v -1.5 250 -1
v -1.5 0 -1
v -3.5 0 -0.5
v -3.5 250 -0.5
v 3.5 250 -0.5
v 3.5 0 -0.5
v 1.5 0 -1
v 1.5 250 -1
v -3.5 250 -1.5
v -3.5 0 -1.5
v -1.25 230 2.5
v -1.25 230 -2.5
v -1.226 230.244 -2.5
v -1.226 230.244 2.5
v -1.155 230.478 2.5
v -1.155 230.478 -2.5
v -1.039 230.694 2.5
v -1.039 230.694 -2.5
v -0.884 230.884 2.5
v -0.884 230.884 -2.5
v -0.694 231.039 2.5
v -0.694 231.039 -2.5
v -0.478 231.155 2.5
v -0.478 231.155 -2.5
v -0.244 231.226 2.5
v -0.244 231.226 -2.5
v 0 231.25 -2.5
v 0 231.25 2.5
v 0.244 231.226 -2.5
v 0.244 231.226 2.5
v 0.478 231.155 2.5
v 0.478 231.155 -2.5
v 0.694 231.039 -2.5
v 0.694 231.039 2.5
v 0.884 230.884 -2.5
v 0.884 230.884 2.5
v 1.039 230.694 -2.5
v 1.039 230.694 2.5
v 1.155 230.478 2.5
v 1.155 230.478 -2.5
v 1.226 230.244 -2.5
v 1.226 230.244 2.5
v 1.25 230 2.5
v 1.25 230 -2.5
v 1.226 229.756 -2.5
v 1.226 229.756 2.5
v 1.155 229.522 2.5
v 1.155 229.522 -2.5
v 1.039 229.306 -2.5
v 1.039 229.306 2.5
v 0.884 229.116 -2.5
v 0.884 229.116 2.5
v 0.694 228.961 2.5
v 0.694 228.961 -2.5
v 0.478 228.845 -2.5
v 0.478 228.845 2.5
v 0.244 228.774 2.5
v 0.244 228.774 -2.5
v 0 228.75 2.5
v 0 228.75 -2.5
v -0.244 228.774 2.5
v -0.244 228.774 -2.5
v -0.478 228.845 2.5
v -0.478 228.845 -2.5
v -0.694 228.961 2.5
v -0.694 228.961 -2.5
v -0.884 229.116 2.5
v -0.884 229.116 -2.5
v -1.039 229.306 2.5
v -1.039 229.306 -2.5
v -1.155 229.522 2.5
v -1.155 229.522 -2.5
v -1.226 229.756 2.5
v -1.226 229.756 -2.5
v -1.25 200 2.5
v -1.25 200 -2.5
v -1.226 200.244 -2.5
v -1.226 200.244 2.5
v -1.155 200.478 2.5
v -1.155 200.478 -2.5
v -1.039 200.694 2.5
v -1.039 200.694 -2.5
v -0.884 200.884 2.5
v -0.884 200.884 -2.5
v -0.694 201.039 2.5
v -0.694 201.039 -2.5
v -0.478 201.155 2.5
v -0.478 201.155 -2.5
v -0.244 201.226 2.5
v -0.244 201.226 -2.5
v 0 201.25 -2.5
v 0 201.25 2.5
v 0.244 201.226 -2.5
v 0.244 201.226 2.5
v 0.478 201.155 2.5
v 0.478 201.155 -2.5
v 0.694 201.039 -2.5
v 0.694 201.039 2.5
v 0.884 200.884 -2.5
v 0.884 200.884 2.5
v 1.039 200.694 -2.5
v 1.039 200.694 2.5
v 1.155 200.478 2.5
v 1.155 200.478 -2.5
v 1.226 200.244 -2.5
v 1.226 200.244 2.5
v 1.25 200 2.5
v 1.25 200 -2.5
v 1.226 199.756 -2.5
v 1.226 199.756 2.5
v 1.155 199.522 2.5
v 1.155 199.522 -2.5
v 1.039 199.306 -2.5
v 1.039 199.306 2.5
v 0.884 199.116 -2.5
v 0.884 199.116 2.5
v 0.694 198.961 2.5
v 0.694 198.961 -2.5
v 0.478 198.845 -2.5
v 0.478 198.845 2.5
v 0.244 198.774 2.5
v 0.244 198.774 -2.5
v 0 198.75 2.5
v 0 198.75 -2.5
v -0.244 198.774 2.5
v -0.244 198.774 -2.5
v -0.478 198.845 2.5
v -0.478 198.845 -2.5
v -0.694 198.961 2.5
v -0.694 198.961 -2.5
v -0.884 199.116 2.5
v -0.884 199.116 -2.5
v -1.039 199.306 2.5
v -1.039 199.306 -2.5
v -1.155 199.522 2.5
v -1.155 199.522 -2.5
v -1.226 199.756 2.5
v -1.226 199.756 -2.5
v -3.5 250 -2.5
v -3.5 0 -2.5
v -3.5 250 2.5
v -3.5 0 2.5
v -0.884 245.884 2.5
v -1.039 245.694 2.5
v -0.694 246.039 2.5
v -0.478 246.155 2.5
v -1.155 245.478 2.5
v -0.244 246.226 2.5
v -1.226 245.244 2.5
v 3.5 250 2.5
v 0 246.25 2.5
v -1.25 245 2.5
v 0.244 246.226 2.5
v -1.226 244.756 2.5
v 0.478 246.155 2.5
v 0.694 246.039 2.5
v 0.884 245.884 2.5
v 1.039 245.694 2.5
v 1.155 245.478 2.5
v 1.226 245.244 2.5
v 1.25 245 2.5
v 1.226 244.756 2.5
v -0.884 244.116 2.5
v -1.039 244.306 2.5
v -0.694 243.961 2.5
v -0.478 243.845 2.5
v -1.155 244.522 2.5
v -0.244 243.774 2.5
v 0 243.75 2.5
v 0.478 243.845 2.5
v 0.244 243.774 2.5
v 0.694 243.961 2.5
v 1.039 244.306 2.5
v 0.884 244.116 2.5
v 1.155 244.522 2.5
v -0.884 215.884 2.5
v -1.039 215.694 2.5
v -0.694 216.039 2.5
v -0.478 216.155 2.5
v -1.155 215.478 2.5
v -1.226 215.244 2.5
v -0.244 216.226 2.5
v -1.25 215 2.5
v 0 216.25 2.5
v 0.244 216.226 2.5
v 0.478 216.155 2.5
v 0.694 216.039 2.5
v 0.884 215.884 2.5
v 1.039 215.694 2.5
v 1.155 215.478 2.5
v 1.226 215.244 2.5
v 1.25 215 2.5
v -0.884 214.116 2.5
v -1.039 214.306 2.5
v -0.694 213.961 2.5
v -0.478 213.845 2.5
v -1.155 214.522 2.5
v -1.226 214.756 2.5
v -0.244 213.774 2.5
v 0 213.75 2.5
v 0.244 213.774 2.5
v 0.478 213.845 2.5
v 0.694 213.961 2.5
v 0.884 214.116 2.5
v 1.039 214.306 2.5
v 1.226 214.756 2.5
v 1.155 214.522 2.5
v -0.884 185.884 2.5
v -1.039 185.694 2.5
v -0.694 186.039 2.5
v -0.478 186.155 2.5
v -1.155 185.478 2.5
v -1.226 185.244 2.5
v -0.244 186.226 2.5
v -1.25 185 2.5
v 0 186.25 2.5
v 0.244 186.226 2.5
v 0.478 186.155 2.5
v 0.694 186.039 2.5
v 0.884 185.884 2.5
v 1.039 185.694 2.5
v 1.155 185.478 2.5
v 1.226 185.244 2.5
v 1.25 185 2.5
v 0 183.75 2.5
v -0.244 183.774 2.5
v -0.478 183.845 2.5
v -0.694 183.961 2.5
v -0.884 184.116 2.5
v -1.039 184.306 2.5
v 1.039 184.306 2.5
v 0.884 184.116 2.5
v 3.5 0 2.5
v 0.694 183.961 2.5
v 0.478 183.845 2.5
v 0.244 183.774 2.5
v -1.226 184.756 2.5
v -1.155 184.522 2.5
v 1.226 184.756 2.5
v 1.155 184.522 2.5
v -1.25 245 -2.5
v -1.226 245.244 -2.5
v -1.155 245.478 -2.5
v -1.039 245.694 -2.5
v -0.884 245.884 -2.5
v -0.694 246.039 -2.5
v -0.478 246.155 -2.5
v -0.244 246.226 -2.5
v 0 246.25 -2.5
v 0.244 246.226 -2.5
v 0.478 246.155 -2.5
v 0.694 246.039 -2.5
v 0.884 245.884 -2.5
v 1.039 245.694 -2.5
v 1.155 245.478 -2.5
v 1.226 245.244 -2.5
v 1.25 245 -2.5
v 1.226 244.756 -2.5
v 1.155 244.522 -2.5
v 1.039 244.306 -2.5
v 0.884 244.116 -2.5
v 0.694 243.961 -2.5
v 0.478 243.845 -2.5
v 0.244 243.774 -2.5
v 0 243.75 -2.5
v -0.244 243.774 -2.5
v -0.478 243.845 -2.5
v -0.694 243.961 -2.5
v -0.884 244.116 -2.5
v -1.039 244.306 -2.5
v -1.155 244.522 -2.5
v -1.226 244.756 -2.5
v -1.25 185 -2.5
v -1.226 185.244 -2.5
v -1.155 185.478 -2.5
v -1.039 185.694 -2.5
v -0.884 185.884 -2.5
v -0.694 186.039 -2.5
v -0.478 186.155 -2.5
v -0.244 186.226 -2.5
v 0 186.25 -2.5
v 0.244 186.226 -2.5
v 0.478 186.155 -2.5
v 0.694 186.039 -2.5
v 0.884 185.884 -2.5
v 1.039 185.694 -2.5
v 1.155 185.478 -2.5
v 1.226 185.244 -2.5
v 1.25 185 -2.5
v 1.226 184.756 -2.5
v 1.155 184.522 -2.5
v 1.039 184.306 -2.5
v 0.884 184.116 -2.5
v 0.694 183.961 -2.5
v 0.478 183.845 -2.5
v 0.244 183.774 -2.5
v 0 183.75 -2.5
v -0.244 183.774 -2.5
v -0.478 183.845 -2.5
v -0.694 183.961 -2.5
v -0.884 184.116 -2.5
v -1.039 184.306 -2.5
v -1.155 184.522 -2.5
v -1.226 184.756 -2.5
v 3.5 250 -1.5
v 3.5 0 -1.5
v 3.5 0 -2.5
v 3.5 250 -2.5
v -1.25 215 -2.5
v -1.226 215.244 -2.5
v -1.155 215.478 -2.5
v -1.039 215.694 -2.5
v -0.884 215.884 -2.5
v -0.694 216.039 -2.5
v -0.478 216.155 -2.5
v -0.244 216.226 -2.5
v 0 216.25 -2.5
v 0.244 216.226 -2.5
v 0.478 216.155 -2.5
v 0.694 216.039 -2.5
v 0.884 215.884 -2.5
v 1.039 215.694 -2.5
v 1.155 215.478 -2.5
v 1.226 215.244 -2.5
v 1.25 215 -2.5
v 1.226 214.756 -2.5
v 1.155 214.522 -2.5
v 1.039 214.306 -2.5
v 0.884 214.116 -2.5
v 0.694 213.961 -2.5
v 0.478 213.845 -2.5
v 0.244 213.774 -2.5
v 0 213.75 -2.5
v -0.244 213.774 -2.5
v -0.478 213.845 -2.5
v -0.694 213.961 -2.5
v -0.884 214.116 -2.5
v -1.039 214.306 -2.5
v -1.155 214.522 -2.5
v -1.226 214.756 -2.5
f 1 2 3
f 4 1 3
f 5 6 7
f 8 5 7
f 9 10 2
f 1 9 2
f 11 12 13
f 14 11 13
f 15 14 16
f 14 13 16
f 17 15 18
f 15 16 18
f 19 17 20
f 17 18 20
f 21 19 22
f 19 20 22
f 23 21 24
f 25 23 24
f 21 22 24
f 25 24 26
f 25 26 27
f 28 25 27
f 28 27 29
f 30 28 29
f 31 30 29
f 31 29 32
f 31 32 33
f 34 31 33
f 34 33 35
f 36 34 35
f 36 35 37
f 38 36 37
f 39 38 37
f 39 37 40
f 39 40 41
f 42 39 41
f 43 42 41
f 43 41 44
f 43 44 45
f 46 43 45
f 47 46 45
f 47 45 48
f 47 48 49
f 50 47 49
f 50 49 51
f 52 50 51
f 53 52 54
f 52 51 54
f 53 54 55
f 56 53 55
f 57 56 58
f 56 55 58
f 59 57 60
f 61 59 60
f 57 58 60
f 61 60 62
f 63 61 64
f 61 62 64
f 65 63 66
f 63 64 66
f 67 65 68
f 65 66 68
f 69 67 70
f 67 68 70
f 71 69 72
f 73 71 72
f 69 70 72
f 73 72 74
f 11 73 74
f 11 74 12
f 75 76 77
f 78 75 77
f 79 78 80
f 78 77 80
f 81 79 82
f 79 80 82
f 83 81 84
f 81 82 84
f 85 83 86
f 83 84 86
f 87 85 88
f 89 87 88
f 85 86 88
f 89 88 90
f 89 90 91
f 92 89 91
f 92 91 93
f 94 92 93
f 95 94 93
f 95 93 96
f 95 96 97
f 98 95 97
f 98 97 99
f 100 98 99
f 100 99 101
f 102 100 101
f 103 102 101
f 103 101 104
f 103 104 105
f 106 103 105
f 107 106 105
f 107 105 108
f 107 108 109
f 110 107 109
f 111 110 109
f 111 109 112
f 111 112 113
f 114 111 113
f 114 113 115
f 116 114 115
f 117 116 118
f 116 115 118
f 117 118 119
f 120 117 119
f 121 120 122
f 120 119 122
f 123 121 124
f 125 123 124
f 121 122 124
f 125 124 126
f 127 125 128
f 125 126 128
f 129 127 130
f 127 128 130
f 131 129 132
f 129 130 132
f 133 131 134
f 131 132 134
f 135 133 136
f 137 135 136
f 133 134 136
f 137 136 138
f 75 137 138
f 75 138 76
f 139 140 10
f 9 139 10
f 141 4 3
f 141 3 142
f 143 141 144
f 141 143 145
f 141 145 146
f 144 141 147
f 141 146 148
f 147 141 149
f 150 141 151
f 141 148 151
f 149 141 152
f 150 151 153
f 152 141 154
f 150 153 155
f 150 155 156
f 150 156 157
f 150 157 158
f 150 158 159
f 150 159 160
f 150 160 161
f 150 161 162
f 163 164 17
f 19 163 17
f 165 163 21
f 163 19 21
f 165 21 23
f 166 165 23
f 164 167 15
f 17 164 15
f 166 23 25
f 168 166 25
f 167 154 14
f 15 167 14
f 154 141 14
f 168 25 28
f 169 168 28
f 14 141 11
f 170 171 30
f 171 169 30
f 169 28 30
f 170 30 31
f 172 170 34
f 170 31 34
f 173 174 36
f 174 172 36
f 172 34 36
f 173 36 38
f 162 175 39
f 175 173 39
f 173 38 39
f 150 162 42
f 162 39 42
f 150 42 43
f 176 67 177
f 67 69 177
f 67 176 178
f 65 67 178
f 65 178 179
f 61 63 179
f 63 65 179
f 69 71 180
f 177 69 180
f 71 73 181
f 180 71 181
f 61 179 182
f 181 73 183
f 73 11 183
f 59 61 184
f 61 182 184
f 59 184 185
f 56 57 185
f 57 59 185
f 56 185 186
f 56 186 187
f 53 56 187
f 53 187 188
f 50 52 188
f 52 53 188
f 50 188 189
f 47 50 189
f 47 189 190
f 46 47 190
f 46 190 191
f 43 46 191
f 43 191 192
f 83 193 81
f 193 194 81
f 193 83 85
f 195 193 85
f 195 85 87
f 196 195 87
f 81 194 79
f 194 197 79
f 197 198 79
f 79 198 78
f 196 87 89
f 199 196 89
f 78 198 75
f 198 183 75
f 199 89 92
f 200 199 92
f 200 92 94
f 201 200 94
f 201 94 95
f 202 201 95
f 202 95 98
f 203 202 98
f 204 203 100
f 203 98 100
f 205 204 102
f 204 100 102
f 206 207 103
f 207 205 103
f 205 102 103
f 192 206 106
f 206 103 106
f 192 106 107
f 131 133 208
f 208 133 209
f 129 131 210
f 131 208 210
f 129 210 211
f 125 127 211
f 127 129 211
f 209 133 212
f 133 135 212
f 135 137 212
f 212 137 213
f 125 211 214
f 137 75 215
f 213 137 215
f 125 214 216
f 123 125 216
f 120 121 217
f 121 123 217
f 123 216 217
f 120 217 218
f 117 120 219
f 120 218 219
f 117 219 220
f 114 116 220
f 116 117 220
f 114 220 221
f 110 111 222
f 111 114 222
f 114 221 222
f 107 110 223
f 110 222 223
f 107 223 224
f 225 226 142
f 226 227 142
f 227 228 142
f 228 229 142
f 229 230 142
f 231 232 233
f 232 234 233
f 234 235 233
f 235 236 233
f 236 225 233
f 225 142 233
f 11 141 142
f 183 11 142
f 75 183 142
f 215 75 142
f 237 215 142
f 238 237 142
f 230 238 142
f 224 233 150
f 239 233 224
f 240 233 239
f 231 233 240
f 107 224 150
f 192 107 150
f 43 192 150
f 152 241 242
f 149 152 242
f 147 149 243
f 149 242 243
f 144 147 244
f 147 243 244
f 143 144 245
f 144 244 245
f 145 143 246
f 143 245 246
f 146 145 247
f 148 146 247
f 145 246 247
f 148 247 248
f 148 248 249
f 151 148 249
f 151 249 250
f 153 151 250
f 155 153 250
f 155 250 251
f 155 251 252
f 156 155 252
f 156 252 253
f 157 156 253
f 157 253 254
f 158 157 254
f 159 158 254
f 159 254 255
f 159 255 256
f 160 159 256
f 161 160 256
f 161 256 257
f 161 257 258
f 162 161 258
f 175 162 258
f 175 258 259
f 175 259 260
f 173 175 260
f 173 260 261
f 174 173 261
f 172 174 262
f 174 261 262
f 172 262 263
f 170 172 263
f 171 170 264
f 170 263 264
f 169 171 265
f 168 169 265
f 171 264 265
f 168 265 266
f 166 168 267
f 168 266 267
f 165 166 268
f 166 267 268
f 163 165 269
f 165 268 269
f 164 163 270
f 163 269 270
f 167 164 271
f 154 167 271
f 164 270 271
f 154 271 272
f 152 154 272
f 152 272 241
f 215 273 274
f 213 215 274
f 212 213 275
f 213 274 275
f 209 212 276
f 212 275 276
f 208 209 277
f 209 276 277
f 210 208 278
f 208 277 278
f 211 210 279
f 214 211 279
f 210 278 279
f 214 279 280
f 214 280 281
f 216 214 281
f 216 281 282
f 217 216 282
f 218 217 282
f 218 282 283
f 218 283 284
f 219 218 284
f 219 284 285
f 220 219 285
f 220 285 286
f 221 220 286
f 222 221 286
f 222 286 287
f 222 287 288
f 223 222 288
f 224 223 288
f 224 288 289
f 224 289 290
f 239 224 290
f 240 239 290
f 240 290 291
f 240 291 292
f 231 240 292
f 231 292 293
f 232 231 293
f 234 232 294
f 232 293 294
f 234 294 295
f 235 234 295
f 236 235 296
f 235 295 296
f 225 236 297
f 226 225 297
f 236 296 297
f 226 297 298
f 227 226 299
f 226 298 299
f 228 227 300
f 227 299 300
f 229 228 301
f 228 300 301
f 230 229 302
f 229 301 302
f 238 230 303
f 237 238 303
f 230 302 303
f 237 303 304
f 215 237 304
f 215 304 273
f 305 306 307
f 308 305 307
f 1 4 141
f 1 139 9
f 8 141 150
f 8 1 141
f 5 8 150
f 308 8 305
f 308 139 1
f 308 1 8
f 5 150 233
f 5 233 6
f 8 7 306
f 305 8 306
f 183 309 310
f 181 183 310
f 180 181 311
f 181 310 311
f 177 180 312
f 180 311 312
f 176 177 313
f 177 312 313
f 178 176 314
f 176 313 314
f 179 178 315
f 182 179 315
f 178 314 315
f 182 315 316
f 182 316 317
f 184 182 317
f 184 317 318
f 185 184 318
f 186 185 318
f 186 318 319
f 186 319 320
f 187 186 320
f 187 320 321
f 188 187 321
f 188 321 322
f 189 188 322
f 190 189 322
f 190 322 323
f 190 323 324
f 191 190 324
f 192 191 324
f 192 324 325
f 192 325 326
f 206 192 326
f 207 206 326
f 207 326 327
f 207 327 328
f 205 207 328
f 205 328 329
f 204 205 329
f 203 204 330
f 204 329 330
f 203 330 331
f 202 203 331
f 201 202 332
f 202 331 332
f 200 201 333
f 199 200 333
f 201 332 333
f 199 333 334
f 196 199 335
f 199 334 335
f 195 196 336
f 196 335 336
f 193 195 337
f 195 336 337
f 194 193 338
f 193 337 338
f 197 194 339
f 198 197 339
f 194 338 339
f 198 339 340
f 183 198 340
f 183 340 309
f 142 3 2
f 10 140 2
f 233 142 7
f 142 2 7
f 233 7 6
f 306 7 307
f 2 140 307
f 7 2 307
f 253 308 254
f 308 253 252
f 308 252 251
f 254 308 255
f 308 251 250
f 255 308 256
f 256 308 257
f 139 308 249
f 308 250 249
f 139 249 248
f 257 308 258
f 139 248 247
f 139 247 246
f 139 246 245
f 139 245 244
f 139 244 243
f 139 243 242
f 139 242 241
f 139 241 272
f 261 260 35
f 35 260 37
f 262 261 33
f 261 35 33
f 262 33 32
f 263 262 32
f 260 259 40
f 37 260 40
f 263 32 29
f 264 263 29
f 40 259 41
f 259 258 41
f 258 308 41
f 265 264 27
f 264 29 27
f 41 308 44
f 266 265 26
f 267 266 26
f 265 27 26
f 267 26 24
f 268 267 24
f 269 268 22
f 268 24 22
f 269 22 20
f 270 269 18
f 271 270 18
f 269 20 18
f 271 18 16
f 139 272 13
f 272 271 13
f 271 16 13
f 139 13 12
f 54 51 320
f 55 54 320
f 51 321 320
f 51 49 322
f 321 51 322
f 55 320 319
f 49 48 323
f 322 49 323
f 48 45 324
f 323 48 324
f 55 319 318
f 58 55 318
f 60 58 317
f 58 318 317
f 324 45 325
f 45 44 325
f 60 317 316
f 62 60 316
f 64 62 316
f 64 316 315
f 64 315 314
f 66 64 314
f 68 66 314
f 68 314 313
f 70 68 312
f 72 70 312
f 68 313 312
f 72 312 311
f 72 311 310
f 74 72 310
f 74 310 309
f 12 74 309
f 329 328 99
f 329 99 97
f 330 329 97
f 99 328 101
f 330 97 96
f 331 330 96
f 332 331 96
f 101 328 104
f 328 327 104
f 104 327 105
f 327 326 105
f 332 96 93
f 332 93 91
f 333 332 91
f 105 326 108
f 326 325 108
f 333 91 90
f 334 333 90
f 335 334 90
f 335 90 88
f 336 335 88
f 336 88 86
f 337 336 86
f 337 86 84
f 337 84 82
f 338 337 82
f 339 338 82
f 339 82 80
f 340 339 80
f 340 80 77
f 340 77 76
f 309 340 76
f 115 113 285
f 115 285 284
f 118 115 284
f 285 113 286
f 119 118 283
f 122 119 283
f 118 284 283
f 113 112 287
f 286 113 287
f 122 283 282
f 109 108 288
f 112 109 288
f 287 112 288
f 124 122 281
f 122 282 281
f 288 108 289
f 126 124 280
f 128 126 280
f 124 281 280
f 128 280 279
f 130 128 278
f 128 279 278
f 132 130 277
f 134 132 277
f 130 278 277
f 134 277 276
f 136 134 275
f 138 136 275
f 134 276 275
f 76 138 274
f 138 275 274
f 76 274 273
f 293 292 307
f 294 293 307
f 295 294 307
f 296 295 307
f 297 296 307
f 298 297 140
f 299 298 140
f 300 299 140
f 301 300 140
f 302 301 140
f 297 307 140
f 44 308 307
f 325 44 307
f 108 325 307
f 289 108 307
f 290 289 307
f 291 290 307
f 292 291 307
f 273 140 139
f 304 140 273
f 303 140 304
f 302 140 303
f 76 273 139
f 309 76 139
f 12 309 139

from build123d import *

# Parameters (mm, degrees)
EXTRUDE_1_DEPTH        = 250
SKETCH_2_R             = 1.25
CUT_EXTRUDE_3_DEPTH    = 251.074488903
PATTERN_LINEAR_1_COUNT = 5
PATTERN_LINEAR_1_PITCH = 15


with BuildPart() as part:
    # 草图1 → 凸台-拉伸1 (new body)
    with BuildSketch(Plane(origin=(0, 0, 0), x_dir=(1, 0, 0), z_dir=(0, 1, 0))):
        Polygon((-3.5, 1.5), (-1.5, 1), (-3.5, 0.5), (-3.5, -2.5), (3.5, -2.5), (3.5, 0.5), (1.5, 1), (3.5, 1.5), (3.5, 2.5), (-3.5, 2.5), align=None)
    extrude(amount=EXTRUDE_1_DEPTH)

    # 草图2 → 切除-拉伸3 (cut, through all)
    with BuildSketch(Plane(origin=(0, 0, -2.5), x_dir=(-1, 0, 0), z_dir=(0, 0, -1))):
        with Locations((0, 245)):
            Circle(SKETCH_2_R)
    cut_extrude_3 = extrude(amount=-CUT_EXTRUDE_3_DEPTH, mode=Mode.SUBTRACT)

    # 阵列(线性)1: 切除-拉伸3 ×5
    with Locations(*[(0, -i * PATTERN_LINEAR_1_PITCH, 0) for i in range(1, PATTERN_LINEAR_1_COUNT)]):
        add(cut_extrude_3, mode=Mode.SUBTRACT)


solid = part.part
